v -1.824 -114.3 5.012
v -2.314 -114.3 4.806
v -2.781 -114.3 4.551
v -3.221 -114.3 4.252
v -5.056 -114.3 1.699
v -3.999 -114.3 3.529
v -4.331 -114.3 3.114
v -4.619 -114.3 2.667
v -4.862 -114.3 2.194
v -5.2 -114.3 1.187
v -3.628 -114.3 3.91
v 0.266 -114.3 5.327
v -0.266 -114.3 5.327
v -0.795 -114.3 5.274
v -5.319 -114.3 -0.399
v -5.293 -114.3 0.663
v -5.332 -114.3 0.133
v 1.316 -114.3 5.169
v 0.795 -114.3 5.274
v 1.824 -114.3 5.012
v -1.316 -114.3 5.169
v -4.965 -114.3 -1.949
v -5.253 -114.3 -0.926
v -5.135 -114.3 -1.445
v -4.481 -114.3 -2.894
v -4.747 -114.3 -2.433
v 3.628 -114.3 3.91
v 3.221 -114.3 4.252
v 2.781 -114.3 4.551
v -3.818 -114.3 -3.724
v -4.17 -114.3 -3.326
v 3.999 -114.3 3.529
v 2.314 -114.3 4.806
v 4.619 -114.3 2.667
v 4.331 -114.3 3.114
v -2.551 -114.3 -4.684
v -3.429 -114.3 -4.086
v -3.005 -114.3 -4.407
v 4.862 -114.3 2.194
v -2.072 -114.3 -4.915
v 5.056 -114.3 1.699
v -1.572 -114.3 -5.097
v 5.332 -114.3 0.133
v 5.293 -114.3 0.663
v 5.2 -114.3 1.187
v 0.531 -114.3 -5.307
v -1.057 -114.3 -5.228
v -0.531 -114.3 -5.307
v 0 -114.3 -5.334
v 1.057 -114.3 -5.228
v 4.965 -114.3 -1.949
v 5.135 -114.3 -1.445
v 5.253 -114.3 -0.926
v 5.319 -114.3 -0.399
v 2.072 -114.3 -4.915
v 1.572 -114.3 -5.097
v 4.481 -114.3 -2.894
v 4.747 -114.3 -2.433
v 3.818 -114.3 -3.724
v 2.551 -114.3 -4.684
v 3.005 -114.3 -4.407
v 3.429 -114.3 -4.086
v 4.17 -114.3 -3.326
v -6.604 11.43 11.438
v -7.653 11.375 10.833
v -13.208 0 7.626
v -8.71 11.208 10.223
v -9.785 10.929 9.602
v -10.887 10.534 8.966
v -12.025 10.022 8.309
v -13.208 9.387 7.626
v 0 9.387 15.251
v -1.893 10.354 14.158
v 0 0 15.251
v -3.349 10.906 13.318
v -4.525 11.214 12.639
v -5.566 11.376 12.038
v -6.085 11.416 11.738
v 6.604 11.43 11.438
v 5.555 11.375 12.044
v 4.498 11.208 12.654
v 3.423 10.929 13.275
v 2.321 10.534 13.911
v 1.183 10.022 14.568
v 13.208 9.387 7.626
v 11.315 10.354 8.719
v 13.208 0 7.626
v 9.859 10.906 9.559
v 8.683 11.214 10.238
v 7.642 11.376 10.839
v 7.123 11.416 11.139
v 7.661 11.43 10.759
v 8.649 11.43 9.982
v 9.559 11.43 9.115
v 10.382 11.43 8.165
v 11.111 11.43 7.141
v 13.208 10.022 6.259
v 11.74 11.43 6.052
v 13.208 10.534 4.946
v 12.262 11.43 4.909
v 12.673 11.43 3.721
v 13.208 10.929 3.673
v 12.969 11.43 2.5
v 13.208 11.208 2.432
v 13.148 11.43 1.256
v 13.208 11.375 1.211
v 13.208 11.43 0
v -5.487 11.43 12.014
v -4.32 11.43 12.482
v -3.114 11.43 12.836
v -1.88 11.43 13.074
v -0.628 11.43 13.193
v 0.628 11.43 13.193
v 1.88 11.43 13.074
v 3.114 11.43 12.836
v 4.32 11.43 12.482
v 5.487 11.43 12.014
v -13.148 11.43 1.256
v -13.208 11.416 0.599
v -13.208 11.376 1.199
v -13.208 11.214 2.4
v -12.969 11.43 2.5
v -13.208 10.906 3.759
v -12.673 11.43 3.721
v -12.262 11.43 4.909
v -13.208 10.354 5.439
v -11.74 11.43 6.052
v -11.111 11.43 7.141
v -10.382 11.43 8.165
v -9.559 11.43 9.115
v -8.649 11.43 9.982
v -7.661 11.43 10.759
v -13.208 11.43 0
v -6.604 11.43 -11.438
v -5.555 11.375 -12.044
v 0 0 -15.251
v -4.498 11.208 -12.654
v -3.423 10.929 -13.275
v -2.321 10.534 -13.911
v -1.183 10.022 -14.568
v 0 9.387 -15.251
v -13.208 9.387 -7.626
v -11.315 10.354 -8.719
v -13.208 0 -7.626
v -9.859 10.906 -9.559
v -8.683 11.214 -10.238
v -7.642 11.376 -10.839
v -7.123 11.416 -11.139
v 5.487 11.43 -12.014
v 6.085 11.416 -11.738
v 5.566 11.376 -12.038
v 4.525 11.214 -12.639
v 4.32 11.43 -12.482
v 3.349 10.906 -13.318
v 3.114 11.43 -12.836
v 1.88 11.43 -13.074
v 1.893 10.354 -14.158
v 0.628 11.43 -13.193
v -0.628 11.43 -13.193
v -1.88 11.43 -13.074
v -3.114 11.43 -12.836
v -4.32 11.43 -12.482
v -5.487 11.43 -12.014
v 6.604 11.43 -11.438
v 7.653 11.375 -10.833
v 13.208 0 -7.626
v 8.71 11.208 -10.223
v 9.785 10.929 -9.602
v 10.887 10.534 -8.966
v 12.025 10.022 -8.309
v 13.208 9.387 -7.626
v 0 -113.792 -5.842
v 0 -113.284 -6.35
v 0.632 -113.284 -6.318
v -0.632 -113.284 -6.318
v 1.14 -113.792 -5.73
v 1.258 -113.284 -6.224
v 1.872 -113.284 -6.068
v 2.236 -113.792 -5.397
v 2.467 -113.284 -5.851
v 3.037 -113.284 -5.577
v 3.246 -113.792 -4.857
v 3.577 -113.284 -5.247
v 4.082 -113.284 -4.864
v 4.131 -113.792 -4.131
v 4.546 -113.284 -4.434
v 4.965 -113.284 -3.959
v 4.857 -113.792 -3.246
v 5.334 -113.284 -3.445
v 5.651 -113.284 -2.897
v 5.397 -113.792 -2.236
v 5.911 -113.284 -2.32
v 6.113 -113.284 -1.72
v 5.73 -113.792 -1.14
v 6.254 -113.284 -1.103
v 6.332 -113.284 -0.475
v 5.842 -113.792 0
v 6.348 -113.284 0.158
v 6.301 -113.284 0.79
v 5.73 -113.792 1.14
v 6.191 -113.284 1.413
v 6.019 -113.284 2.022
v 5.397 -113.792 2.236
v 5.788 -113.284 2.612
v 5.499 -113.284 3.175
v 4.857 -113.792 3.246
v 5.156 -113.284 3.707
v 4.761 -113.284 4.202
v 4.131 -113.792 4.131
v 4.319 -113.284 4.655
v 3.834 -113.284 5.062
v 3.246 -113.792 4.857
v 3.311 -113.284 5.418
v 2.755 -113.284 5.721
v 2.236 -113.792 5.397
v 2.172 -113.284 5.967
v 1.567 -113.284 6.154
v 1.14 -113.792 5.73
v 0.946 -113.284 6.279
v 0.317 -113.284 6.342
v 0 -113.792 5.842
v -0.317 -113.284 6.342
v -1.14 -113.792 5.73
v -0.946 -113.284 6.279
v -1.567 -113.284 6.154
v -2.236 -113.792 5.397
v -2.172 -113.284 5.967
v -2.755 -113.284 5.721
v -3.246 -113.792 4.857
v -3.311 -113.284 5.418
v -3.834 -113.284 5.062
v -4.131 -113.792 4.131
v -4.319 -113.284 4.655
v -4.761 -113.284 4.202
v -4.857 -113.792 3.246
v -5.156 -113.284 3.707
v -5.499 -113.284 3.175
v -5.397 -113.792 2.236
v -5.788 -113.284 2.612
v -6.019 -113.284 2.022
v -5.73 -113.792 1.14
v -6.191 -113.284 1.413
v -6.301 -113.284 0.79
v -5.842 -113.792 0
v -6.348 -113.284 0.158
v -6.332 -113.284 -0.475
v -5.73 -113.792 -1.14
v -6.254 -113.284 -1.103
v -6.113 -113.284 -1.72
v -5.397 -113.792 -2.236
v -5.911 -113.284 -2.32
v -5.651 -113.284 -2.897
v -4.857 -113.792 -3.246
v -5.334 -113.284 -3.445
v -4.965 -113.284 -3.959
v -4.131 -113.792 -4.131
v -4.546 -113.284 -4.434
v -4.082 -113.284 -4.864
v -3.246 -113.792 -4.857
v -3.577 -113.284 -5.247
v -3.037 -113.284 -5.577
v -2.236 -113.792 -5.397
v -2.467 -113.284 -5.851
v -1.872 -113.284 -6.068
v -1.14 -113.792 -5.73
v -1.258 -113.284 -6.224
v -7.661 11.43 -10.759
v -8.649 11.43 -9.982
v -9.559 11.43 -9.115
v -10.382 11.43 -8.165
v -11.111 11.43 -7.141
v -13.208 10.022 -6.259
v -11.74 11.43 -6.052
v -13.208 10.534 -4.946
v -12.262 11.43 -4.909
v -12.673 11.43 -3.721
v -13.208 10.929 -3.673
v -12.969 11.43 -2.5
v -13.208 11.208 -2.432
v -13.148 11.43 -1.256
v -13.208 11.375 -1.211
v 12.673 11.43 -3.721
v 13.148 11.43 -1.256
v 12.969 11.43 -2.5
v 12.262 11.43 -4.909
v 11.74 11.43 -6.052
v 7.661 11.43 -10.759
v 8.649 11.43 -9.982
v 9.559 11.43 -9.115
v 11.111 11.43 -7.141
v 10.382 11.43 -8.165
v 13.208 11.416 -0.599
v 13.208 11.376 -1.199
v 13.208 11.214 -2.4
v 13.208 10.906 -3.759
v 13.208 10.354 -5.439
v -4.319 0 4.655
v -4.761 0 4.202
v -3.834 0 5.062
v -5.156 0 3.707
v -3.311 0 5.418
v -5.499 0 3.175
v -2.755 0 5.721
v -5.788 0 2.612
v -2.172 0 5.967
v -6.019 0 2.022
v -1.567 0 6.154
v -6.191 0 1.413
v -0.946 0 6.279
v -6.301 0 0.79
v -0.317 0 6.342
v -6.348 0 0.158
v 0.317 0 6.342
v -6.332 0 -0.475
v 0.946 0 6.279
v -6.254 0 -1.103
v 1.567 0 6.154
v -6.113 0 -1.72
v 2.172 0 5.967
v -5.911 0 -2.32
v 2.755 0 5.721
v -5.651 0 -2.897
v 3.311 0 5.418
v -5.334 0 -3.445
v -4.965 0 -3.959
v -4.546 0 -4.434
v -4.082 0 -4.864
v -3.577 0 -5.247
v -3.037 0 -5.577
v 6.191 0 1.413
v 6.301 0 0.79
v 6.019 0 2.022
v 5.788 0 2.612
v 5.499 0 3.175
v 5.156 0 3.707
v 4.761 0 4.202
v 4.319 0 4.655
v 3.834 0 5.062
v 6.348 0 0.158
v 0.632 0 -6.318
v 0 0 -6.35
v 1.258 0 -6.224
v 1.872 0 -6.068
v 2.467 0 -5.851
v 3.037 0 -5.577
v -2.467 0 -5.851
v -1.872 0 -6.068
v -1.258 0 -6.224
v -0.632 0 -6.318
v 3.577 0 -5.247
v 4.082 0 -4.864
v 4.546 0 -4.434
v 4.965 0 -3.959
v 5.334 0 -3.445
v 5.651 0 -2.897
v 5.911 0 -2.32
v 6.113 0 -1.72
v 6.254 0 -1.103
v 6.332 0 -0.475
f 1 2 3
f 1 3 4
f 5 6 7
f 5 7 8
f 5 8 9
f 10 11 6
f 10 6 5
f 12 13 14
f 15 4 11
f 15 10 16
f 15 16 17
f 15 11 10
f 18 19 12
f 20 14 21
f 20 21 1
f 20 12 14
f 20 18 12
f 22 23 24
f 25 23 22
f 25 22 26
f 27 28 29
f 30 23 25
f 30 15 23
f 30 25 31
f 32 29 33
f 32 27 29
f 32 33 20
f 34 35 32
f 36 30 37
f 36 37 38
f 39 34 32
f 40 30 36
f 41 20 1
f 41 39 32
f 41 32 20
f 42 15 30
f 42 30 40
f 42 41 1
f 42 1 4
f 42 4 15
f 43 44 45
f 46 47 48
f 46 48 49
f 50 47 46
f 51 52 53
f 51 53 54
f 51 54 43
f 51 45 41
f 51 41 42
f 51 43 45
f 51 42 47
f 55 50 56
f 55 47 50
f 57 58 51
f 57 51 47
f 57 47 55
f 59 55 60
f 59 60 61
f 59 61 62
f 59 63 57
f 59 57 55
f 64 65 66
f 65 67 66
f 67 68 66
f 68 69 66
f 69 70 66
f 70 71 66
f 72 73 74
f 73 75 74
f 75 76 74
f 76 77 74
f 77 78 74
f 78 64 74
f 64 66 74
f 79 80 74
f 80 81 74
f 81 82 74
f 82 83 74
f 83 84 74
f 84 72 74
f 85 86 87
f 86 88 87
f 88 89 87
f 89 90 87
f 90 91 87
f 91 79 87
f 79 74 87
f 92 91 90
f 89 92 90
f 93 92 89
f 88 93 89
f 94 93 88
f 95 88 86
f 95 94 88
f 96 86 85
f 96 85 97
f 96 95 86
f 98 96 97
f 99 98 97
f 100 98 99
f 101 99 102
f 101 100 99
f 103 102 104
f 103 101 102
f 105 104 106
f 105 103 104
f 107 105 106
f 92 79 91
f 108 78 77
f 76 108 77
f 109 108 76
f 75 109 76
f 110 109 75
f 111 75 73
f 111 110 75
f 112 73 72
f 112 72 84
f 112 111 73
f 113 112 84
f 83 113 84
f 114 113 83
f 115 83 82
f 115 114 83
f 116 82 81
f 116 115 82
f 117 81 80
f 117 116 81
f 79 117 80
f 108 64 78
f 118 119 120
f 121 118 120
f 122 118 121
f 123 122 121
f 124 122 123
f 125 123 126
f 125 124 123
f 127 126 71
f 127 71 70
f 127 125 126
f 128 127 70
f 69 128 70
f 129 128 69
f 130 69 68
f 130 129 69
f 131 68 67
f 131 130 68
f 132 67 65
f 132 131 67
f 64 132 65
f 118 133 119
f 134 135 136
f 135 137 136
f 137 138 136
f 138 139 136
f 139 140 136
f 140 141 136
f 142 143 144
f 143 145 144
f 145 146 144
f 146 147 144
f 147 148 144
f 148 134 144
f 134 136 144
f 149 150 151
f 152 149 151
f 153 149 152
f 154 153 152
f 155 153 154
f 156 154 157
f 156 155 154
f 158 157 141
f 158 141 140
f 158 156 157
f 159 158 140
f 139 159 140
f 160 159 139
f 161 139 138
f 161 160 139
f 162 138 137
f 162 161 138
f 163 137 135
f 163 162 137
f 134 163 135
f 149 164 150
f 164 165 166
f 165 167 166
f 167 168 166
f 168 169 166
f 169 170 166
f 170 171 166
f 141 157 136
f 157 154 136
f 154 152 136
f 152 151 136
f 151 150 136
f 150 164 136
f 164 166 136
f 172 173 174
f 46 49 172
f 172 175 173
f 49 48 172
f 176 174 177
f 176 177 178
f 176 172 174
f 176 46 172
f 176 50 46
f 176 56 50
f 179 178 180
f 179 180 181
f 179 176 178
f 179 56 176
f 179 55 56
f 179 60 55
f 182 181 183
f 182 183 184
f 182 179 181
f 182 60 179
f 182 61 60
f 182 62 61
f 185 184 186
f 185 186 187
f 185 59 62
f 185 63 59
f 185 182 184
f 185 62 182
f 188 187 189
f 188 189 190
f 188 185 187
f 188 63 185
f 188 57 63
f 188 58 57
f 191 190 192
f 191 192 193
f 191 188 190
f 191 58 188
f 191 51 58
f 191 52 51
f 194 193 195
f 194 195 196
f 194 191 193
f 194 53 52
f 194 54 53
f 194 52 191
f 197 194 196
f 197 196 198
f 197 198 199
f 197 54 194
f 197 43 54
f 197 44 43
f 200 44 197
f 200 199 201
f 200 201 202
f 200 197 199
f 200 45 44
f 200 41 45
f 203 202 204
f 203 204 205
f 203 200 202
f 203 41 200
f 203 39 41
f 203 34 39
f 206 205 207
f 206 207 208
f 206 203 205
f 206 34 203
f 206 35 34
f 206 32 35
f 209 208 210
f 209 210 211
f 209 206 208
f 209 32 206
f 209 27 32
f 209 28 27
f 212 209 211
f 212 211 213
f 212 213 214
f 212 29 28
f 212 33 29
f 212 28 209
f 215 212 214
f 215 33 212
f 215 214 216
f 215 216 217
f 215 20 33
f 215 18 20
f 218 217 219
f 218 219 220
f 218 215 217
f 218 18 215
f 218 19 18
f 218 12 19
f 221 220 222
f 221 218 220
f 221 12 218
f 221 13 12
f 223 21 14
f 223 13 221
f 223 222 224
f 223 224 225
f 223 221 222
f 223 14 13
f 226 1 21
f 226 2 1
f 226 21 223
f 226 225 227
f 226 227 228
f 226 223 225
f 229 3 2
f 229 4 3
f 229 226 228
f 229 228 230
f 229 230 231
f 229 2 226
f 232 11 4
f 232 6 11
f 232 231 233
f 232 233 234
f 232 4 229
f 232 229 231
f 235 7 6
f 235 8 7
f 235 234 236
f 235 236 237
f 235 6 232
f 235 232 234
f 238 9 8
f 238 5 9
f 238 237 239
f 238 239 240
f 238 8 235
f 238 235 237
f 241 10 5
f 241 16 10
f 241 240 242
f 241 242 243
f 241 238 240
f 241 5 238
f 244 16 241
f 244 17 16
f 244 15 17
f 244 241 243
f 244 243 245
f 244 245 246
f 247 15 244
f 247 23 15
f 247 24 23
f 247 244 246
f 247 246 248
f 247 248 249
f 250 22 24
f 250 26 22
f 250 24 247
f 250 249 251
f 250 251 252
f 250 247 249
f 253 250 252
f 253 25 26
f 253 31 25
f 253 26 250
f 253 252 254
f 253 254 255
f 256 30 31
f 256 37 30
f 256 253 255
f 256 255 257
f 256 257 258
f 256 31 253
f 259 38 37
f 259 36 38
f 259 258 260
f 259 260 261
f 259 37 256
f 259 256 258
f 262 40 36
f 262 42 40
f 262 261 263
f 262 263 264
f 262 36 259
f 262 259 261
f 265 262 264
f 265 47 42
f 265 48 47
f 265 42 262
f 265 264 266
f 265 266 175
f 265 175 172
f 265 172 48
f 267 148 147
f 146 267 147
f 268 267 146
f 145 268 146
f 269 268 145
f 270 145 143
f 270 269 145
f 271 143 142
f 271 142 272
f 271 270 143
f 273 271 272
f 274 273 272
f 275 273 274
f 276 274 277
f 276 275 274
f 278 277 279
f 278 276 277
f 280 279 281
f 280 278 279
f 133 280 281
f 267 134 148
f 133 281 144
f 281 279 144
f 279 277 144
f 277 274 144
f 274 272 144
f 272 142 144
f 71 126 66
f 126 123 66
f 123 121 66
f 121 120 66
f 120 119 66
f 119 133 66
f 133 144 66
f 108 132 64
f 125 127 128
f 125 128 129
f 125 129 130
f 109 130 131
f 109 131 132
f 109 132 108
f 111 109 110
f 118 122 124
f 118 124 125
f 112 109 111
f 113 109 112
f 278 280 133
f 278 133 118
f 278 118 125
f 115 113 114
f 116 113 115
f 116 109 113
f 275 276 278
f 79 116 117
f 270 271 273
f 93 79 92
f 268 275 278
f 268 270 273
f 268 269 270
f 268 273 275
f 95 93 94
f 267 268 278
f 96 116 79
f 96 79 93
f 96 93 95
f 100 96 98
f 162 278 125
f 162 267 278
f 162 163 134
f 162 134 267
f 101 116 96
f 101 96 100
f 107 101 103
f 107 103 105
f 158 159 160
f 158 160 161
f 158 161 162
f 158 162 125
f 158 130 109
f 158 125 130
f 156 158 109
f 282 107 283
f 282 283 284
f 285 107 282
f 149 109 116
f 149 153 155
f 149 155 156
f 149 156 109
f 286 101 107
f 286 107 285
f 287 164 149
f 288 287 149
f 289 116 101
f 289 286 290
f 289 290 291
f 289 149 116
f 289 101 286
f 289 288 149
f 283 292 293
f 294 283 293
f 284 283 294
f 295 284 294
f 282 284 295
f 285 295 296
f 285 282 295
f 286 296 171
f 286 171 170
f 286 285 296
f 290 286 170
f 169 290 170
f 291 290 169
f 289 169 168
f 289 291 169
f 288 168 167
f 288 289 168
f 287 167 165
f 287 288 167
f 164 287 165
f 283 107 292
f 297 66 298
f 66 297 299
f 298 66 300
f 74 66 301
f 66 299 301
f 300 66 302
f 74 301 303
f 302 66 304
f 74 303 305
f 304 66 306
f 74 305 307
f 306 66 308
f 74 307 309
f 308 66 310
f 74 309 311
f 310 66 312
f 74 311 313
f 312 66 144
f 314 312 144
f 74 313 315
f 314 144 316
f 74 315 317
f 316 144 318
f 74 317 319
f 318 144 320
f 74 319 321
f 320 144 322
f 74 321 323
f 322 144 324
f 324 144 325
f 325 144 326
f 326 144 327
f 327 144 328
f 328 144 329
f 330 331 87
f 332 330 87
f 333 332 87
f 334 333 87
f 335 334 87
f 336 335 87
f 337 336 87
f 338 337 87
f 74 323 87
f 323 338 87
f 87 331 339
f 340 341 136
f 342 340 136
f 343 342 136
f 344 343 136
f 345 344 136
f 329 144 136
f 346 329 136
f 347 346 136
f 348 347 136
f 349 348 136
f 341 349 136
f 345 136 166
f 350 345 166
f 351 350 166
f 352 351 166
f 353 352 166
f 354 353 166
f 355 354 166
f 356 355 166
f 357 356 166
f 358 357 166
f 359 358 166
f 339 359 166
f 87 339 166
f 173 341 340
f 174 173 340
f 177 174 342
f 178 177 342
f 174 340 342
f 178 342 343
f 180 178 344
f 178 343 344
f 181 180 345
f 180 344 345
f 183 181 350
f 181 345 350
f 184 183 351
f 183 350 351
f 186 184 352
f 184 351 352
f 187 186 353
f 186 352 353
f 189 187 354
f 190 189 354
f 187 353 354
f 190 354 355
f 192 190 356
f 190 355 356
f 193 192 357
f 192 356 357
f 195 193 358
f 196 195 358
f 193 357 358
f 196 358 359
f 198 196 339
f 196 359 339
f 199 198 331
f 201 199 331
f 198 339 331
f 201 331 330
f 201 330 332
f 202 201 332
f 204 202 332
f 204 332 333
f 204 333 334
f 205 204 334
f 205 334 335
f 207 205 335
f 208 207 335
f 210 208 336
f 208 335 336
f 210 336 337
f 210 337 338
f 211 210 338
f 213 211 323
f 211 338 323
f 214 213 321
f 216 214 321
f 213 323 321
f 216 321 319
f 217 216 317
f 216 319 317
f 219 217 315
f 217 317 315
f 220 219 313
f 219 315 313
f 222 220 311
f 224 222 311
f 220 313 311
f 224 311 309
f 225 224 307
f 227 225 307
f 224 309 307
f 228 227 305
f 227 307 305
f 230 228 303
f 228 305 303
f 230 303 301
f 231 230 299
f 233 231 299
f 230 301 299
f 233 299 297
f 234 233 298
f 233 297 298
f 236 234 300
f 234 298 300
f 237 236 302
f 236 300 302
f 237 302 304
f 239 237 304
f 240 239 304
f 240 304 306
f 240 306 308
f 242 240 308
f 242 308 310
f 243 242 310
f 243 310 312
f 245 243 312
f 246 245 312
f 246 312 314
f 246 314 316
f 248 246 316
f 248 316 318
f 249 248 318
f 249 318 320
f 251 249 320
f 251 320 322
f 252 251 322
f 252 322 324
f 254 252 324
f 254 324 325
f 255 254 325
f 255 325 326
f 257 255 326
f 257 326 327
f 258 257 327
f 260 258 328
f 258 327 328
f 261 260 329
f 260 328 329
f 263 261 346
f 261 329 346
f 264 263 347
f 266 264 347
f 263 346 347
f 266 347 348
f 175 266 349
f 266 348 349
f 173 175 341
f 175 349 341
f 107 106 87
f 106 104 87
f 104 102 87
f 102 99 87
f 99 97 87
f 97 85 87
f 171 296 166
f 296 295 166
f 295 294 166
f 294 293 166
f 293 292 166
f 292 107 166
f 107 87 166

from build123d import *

# Parameters (mm, degrees)
BOSS_EXTRUDE2_DEPTH = 11.43
SKETCH7_OUTSIDE_W   = 59.664
SKETCH7_OUTSIDE_H   = 63.75
SKETCH7_OUTSIDE_R   = 13.208
CUT_EXTRUDE1_DEPTH  = 11.43
CUT_EXTRUDE1_DRAFT  = -45
SKETCH9_R           = 6.35
BOSS_EXTRUDE6_DEPTH = 114.3
CHAMFER3_SIZE       = 1.016


with BuildPart() as part:
    # Sketch5 → Boss-Extrude2 (new body)
    with BuildSketch(Plane(origin=(0, 0, 0), x_dir=(1, 0, 0), z_dir=(0, 1, 0))):
        Polygon((13.208, -7.625642355), (13.208, 7.625642355), (0, 15.251284711), (-13.208, 7.625642355), (-13.208, -7.625642355), (0, -15.251284711), align=None)
    extrude(amount=BOSS_EXTRUDE2_DEPTH)


with BuildPart() as cut_extrude1_tool:
    # Sketch7 outside → Cut-Extrude1 (with draft: the straight prism first)
    with BuildSketch(Plane(origin=(0, 11.43, 0), x_dir=(1, 0, 0), z_dir=(0, 1, 0))):
        Rectangle(SKETCH7_OUTSIDE_W, SKETCH7_OUTSIDE_H)
        Circle(SKETCH7_OUTSIDE_R, mode=Mode.SUBTRACT)
    extrude(amount=-CUT_EXTRUDE1_DEPTH)
    # Cut-Extrude1: the draft: its side faces are tilted about the plane it starts from
    cut_extrude1_sides = [cut_extrude1_tool.faces().sort_by_distance(p)[0] for p in [
        (0, 5.715, 31.875),
        (29.832, 5.715, 0),
        (0, 5.715, -31.875),
        (-29.832, 5.715, 0),
        (-13.208, 5.715, 0),
    ]]
    draft(cut_extrude1_sides, Plane(origin=(0, 11.43, 0), x_dir=(1, 0, 0), z_dir=(0, 1, 0)), CUT_EXTRUDE1_DRAFT)


with BuildPart() as part_1:
    add(part.part)

    # Cut-Extrude1: cut by cut_extrude1_tool
    add(cut_extrude1_tool.part, mode=Mode.SUBTRACT)

    # Sketch9 → Boss-Extrude6 (add)
    with BuildSketch(Plane(origin=(0, 0, 0), x_dir=(-1, 0, 0), z_dir=(0, -1, 0))):
        with Locations(Location((0, 0, 0), (0, 0, 90))):
            Circle(SKETCH9_R)
    extrude(amount=BOSS_EXTRUDE6_DEPTH)

    # Chamfer3
    chamfer3_edges = [part_1.edges().sort_by_distance(p)[0] for p in [
        (0, -114.3, 6.35),
    ]]
    chamfer(chamfer3_edges, length=CHAMFER3_SIZE)


solid = part_1.part
